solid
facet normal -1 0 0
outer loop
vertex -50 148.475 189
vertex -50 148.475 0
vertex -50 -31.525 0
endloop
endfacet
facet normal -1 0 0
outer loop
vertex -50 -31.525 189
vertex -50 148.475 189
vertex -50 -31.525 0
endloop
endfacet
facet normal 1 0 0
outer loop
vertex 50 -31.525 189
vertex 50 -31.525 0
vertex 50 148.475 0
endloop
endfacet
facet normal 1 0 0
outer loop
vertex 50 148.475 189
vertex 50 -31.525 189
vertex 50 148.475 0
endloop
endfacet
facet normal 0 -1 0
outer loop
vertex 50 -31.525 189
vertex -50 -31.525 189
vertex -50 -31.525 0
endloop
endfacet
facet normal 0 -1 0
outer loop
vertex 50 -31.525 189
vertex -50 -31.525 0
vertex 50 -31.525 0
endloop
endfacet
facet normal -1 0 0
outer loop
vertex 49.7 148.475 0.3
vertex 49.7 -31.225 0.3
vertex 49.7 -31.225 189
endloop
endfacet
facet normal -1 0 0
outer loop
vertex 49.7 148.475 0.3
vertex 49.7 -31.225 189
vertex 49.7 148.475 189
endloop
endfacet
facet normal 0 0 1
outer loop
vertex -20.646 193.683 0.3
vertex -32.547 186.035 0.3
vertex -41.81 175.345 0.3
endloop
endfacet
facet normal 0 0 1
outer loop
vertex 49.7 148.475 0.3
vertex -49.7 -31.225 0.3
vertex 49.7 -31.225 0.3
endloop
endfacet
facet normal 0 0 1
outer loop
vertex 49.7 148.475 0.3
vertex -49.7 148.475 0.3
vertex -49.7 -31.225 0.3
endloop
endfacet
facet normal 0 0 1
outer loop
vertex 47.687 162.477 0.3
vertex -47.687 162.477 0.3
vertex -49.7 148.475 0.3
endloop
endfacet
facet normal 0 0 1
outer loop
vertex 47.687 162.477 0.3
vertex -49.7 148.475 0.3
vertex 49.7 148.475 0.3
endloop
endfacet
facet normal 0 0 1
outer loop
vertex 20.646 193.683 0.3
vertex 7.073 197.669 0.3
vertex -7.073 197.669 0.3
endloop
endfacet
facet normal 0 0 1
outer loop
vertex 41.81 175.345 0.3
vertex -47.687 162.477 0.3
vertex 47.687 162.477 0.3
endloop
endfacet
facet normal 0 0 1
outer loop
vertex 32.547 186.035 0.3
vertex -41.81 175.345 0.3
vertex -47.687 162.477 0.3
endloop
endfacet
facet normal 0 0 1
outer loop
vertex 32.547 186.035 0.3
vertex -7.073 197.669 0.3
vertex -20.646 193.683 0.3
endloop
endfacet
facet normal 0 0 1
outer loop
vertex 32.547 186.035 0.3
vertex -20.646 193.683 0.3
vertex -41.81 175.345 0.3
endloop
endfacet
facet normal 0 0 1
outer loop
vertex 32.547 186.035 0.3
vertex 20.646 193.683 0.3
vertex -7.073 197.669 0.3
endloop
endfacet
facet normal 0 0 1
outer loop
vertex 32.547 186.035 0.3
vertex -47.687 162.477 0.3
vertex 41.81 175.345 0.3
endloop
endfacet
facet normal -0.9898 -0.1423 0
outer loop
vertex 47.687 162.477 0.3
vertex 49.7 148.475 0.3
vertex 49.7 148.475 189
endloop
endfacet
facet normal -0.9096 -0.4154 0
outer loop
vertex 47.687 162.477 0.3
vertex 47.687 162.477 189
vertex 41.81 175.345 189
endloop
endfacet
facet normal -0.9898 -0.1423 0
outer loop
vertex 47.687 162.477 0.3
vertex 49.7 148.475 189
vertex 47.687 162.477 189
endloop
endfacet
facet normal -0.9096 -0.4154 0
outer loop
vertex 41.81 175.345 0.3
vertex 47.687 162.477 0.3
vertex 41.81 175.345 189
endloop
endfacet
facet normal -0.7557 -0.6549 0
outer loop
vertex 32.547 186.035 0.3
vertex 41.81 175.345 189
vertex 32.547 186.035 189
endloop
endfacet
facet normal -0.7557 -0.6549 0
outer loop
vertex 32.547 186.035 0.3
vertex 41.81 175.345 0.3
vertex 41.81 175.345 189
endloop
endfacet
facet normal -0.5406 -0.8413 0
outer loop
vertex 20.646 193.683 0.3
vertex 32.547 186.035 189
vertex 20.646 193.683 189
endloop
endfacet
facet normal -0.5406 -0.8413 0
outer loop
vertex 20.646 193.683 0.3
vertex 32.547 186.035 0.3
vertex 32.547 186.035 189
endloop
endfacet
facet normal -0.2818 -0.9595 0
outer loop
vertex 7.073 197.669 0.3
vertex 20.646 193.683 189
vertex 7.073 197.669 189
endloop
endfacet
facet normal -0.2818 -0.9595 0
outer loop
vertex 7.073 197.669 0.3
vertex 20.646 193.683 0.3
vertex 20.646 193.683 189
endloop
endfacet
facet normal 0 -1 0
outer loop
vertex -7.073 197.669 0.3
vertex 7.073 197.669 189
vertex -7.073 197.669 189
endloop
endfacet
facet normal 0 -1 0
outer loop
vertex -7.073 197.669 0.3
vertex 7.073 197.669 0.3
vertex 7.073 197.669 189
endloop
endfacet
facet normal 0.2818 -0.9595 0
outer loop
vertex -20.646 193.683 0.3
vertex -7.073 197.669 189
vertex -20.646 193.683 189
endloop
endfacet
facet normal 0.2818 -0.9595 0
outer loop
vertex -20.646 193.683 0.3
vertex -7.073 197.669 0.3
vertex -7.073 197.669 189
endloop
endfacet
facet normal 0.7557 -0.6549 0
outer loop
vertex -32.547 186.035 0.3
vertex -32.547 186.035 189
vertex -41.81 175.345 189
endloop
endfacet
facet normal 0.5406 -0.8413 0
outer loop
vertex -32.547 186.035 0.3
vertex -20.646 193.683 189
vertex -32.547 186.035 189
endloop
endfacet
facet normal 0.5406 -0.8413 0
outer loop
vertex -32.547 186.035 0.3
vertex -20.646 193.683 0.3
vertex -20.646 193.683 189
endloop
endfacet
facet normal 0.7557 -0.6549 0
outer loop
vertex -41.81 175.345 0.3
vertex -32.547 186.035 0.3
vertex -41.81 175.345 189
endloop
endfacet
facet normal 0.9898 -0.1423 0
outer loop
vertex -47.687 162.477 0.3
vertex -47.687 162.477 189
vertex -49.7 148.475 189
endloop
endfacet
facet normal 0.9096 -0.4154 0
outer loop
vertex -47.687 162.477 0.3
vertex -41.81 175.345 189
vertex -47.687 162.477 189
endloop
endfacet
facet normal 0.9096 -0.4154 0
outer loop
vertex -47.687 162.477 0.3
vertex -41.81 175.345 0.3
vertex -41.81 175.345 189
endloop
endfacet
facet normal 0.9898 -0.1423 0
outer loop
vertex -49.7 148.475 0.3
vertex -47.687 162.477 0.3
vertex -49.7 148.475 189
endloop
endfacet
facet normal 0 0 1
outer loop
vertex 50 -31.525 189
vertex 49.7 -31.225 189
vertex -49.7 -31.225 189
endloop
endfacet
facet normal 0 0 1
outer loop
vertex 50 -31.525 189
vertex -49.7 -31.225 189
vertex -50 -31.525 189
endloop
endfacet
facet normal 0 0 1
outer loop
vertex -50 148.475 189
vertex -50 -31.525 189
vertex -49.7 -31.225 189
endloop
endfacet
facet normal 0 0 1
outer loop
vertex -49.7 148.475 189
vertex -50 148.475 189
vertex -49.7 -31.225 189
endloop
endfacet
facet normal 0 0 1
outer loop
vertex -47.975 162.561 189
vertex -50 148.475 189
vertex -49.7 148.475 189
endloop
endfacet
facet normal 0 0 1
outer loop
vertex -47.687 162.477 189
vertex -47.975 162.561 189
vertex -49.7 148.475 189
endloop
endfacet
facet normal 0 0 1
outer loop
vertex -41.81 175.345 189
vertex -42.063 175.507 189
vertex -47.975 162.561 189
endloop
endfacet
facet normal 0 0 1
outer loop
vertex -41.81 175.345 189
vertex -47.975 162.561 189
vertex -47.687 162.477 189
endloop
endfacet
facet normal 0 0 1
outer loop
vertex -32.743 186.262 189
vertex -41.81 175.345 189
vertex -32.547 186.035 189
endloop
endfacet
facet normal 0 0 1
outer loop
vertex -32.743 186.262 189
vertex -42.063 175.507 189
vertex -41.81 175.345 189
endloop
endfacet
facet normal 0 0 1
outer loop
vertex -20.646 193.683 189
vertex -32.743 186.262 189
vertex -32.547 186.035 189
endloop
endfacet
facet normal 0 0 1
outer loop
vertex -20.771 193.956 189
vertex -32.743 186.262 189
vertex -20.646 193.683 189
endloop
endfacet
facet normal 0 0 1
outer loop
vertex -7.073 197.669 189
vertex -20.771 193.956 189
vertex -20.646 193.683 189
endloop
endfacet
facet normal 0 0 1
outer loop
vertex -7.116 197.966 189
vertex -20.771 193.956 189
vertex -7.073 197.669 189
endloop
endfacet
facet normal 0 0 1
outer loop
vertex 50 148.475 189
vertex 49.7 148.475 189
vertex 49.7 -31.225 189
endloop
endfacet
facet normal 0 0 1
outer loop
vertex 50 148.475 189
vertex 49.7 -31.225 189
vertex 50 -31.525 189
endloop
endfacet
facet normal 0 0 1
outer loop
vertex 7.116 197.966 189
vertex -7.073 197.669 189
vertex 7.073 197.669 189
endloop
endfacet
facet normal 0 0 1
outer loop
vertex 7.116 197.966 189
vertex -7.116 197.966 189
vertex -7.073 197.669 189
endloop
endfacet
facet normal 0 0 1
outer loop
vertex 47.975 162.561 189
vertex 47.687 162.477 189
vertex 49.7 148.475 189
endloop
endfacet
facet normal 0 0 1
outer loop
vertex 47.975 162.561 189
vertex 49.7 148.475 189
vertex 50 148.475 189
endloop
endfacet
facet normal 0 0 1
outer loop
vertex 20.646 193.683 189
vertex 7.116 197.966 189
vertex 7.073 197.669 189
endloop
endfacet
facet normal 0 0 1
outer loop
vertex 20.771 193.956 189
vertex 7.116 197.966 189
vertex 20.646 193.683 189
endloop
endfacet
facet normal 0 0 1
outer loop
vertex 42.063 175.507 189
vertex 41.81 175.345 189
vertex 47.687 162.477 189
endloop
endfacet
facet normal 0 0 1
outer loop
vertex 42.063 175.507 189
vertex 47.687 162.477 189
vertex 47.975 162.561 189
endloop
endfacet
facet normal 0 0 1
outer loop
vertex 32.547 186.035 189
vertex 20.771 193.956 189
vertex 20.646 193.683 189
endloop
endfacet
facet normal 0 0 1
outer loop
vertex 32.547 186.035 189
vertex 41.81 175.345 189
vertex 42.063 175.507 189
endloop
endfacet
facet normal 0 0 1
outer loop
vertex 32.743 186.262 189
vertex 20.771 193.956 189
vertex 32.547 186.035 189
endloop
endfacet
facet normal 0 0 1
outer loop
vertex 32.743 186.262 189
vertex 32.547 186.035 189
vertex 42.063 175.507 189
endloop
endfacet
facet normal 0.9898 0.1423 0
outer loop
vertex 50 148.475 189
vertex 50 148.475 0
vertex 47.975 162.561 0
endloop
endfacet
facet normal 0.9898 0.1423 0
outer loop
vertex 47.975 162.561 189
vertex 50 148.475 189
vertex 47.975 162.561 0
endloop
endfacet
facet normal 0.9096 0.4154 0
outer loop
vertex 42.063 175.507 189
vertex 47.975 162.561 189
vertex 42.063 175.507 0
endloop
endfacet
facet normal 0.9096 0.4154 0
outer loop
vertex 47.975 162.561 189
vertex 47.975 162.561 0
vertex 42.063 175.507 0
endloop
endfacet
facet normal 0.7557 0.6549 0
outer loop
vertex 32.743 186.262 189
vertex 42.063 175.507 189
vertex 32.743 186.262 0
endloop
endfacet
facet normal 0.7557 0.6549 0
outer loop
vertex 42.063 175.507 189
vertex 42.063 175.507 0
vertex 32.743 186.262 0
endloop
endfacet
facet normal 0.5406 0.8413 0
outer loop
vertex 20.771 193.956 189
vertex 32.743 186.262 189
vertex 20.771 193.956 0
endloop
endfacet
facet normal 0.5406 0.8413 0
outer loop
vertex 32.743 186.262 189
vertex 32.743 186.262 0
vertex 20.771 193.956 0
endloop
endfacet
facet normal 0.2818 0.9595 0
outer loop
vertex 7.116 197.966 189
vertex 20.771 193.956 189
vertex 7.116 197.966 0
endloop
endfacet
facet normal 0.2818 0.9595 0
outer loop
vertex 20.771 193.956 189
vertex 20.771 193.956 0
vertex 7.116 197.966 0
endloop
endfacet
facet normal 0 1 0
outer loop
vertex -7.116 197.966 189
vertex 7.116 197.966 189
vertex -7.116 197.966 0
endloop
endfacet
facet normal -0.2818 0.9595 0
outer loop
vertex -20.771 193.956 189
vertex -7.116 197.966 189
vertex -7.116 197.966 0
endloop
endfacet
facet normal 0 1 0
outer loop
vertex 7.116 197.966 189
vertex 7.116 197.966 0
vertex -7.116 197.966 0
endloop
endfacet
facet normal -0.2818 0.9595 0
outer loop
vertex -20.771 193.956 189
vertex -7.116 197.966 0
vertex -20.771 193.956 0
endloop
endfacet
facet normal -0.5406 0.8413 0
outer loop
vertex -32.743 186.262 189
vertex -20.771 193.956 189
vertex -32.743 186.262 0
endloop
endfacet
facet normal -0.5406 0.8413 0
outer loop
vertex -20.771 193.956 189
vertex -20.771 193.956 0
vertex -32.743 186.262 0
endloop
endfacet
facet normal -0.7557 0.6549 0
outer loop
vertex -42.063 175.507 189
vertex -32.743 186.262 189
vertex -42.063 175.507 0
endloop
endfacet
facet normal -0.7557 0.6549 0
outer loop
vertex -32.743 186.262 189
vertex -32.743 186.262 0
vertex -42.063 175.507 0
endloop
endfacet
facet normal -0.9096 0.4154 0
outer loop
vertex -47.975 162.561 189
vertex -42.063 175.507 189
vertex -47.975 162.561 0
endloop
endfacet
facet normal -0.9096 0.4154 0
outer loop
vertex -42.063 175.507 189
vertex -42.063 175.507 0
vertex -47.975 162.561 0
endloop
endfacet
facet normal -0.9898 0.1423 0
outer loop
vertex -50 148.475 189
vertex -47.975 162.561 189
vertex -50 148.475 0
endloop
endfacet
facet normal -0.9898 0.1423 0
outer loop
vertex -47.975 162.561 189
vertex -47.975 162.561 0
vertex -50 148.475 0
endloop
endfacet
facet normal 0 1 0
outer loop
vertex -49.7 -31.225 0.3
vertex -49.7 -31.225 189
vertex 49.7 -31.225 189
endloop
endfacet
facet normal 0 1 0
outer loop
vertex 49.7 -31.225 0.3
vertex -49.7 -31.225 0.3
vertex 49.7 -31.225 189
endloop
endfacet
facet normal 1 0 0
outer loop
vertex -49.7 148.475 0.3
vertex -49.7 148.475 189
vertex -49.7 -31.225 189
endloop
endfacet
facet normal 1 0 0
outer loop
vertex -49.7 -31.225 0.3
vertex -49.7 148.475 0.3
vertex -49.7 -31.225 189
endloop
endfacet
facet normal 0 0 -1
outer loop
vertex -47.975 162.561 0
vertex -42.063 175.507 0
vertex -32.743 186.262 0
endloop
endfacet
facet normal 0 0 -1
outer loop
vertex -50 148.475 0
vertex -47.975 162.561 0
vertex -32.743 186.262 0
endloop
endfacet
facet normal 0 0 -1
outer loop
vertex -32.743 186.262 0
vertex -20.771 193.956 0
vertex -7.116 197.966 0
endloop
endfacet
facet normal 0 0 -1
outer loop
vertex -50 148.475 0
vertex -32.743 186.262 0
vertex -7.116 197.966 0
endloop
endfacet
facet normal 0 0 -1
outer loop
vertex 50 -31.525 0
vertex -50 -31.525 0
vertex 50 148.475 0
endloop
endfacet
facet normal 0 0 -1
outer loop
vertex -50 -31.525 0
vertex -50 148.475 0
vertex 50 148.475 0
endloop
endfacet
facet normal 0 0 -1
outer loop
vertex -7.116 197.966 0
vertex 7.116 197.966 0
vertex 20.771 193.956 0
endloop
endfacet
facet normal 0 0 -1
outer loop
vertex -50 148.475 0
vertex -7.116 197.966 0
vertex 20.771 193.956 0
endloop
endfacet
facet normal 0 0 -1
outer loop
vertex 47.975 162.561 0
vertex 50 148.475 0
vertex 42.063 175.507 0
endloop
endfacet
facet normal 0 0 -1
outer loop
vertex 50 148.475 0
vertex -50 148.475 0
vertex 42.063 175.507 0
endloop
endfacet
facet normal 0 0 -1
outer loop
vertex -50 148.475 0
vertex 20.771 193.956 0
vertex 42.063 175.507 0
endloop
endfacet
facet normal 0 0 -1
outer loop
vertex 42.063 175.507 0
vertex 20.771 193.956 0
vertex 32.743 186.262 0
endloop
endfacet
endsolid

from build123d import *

# Parameters (mm, degrees)
BOSS_EXTRUDE1_DEPTH = 189
SHELL2_T            = -0.3


with BuildPart() as part:
    # Sketch1 → Boss-Extrude1 (new body)
    with BuildSketch(Plane.XY):
        with BuildLine():
            Line((-50, -31.525272579), (50, -31.525272579))
            Line((50, -31.525272579), (50, 148.474727421))
            ThreePointArc((50, 148.474727421), (0, 198.474727421), (-50, 148.474727421))
            Line((-50, 148.474727421), (-50, -31.525272579))
        make_face()
    extrude(amount=BOSS_EXTRUDE1_DEPTH)

    # Shell2
    shell2_openings = [part.faces().sort_by_distance(p)[0] for p in [
        (0, 78.393671634, 189),
    ]]
    offset(amount=SHELL2_T, openings=shell2_openings, kind=Kind.INTERSECTION)


solid = part.part
